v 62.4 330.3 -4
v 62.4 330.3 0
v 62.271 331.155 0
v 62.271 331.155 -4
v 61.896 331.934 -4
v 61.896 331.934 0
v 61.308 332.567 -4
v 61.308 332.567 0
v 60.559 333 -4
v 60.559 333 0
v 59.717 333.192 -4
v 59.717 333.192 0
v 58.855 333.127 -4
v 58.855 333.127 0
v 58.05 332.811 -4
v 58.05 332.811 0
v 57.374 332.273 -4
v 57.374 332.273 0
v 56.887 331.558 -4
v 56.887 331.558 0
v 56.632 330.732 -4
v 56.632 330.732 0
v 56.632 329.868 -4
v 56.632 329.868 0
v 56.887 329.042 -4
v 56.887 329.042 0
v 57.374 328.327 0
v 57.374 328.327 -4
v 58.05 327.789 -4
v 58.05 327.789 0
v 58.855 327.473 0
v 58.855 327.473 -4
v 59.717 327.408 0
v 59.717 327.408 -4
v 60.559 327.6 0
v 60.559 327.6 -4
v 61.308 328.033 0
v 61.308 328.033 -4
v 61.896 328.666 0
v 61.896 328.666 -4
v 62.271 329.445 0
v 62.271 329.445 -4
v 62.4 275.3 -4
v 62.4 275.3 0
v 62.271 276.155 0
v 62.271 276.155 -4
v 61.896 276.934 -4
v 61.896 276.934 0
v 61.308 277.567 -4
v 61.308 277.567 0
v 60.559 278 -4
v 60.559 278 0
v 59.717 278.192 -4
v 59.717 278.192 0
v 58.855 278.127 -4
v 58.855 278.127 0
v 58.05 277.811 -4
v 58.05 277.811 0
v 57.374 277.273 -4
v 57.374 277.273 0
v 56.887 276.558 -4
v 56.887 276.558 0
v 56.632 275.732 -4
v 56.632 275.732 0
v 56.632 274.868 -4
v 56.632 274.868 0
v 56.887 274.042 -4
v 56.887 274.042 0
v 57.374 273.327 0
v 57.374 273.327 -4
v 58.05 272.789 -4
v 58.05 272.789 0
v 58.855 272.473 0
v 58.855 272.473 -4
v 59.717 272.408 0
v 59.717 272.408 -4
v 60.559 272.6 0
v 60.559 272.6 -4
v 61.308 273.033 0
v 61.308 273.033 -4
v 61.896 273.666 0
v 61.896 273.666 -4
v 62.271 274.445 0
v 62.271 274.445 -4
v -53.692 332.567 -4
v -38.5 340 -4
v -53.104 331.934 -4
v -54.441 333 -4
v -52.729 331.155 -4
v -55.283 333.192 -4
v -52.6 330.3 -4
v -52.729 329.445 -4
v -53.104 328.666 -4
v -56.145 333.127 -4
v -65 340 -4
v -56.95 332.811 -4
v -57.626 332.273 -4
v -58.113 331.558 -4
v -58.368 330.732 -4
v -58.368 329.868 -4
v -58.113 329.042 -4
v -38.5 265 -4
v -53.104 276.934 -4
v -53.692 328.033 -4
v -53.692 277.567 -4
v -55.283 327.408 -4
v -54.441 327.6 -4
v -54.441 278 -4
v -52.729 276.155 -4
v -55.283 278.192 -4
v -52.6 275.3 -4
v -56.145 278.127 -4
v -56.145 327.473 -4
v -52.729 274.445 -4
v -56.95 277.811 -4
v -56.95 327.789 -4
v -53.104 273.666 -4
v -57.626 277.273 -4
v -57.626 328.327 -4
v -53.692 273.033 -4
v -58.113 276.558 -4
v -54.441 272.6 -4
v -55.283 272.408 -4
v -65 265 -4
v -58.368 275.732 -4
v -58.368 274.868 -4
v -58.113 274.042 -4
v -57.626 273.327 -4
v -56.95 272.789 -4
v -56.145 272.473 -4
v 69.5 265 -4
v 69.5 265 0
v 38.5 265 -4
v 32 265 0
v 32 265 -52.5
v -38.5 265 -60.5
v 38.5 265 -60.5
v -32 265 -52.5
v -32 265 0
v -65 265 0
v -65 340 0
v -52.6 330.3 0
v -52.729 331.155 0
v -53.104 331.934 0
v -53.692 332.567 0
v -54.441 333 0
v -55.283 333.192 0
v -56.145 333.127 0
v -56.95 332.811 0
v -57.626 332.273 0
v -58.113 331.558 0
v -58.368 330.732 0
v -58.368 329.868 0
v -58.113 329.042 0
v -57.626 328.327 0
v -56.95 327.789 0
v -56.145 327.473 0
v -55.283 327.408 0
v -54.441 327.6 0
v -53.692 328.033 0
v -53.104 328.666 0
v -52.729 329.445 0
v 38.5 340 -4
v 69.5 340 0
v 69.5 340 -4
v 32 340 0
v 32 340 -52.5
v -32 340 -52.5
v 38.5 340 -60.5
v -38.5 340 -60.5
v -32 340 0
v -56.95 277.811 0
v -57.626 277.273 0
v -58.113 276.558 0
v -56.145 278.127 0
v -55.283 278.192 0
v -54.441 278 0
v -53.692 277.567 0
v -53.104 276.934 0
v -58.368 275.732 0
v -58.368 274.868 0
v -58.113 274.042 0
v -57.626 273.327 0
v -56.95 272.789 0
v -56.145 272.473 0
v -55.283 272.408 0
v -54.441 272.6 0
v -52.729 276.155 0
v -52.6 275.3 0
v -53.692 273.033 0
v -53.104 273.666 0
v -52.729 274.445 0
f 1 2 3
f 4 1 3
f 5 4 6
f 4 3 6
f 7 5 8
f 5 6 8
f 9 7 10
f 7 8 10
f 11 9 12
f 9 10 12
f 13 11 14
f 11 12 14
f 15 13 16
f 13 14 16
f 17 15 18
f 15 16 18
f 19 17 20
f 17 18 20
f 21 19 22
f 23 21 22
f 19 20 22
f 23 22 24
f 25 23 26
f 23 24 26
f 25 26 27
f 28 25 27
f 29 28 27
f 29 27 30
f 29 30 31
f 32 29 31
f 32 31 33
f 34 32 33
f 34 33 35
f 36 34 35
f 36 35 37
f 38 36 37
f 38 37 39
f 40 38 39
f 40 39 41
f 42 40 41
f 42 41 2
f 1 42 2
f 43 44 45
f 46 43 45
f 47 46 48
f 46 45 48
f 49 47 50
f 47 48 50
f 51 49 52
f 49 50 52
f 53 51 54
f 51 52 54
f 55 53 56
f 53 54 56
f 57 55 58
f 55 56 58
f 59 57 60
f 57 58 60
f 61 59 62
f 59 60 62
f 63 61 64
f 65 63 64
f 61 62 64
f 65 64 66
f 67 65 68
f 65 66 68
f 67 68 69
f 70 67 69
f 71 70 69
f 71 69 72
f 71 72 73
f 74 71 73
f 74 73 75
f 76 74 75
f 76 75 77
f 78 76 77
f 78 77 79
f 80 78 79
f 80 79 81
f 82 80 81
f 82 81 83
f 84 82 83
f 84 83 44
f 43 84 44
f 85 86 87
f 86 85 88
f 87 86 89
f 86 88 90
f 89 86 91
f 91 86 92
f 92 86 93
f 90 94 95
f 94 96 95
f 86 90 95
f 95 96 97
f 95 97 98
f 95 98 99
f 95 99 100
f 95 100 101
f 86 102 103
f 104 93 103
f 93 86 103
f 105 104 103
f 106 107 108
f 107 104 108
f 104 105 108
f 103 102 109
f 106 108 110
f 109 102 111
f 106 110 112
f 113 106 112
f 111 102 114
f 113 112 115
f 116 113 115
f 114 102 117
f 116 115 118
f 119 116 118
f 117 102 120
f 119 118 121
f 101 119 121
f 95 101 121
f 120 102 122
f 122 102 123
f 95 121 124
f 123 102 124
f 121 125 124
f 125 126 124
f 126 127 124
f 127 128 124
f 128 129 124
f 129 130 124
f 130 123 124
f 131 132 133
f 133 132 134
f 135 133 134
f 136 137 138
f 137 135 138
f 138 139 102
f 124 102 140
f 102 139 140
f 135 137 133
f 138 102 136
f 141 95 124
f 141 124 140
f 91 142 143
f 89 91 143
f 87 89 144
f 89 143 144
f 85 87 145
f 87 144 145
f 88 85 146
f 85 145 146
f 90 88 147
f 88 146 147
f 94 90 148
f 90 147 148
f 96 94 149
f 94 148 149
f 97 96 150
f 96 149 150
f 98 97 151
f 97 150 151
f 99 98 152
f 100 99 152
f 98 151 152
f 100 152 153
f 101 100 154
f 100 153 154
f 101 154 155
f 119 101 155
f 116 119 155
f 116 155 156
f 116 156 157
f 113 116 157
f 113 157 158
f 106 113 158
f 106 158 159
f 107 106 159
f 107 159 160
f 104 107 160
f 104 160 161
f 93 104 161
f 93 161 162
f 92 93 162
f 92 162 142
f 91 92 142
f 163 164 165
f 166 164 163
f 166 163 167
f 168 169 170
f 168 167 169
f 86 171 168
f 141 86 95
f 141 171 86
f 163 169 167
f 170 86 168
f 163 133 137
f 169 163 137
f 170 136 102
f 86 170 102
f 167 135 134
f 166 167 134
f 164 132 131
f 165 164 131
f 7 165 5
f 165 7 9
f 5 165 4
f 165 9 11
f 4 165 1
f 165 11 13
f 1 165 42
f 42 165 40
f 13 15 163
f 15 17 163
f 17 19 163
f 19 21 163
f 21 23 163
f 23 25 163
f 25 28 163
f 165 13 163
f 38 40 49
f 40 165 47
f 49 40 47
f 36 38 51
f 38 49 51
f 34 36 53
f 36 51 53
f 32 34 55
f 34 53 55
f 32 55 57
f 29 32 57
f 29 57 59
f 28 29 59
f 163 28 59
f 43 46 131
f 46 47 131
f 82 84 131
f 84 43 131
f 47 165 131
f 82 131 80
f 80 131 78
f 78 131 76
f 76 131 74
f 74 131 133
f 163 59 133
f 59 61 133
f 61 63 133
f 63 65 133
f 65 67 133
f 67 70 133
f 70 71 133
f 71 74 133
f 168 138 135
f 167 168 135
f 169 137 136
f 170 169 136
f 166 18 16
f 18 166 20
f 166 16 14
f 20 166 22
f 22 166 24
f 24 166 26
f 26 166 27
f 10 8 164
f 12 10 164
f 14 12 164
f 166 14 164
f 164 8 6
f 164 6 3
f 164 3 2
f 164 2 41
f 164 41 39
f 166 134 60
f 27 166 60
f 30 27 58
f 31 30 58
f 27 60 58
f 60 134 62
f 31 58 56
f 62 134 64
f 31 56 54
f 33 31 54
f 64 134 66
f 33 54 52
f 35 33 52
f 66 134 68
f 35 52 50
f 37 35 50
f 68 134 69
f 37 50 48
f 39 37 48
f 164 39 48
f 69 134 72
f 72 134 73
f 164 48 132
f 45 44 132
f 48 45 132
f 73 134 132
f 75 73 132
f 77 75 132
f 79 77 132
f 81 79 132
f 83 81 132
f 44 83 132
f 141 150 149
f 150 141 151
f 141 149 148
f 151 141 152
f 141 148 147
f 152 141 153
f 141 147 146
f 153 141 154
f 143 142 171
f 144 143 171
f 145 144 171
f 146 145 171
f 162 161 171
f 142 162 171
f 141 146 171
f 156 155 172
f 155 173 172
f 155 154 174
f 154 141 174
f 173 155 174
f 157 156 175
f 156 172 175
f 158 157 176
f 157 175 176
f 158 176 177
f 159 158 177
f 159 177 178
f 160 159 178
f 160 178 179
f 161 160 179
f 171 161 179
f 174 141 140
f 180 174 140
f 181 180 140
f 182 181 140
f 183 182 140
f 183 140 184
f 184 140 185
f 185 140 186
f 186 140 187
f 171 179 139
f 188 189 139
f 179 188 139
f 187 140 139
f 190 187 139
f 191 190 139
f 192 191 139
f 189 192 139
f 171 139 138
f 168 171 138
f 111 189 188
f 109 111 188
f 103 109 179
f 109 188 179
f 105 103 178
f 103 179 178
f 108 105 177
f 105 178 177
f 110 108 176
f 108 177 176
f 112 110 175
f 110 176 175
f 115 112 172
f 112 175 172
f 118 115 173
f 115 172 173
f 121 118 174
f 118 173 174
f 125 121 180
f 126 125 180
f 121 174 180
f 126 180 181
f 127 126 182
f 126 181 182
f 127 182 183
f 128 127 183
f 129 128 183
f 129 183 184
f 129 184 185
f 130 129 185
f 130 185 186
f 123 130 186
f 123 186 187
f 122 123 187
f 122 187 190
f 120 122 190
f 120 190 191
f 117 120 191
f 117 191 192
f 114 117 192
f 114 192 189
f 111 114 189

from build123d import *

# Parameters (mm, degrees)
PAD002_DEPTH   = 75
SKETCH006_R    = 2.9
HOLE002_DEPTH  = 25
HOLE002_TIPS_R = 2.9


with BuildPart() as part:
    # Sketch005 → Pad002 (new body)
    with BuildSketch(Plane.XZ):
        Polygon((-38, 0), (-0.5, 0), (-0.5, -4), (-31.5, -4), (-31.5, -60.5), (-108.5, -60.5), (-108.5, -4), (-135, -4), (-135, 0), (-102, 0), (-102, -52.5), (-38, -52.5), align=None)
    extrude(amount=-PAD002_DEPTH)

    # Sketch006 → Hole002 (cut)
    with BuildSketch(Plane.XY):
        with Locations((-125.500002, 10.3)):
            Circle(SKETCH006_R)
        with Locations((-125.500002, 65.3)):
            Circle(SKETCH006_R)
        with Locations((-10.500002, 10.3)):
            Circle(SKETCH006_R)
        with Locations((-10.500002, 65.3)):
            Circle(SKETCH006_R)
    extrude(amount=-HOLE002_DEPTH, mode=Mode.SUBTRACT)

    # Hole002 tips → Hole002 tip 1 section 0
    with BuildSketch(Plane.XY.offset(-25), mode=Mode.PRIVATE) as hole002_tip_1_s0:
        with Locations((-125.500002, 10.3)):
            Circle(HOLE002_TIPS_R)
    loft([hole002_tip_1_s0.sketch, Vertex(-125.500002, 10.3, -26.742496)], mode=Mode.SUBTRACT)

    # Hole002 tips → Hole002 tip 2 section 0
    with BuildSketch(Plane.XY.offset(-25), mode=Mode.PRIVATE) as hole002_tip_2_s0:
        with Locations((-125.500002, 65.3)):
            Circle(HOLE002_TIPS_R)
    loft([hole002_tip_2_s0.sketch, Vertex(-125.500002, 65.3, -26.742496)], mode=Mode.SUBTRACT)

    # Hole002 tips → Hole002 tip 3 section 0
    with BuildSketch(Plane.XY.offset(-25), mode=Mode.PRIVATE) as hole002_tip_3_s0:
        with Locations((-10.500002, 10.3)):
            Circle(HOLE002_TIPS_R)
    loft([hole002_tip_3_s0.sketch, Vertex(-10.500002, 10.3, -26.742496)], mode=Mode.SUBTRACT)

    # Hole002 tips → Hole002 tip 4 section 0
    with BuildSketch(Plane.XY.offset(-25), mode=Mode.PRIVATE) as hole002_tip_4_s0:
        with Locations((-10.500002, 65.3)):
            Circle(HOLE002_TIPS_R)
    loft([hole002_tip_4_s0.sketch, Vertex(-10.500002, 65.3, -26.742496)], mode=Mode.SUBTRACT)


with BuildPart() as part_1:
    # Body002 placement: moved
    add(part.part.moved(Location((70, 265, 0))))


solid = part_1.part
